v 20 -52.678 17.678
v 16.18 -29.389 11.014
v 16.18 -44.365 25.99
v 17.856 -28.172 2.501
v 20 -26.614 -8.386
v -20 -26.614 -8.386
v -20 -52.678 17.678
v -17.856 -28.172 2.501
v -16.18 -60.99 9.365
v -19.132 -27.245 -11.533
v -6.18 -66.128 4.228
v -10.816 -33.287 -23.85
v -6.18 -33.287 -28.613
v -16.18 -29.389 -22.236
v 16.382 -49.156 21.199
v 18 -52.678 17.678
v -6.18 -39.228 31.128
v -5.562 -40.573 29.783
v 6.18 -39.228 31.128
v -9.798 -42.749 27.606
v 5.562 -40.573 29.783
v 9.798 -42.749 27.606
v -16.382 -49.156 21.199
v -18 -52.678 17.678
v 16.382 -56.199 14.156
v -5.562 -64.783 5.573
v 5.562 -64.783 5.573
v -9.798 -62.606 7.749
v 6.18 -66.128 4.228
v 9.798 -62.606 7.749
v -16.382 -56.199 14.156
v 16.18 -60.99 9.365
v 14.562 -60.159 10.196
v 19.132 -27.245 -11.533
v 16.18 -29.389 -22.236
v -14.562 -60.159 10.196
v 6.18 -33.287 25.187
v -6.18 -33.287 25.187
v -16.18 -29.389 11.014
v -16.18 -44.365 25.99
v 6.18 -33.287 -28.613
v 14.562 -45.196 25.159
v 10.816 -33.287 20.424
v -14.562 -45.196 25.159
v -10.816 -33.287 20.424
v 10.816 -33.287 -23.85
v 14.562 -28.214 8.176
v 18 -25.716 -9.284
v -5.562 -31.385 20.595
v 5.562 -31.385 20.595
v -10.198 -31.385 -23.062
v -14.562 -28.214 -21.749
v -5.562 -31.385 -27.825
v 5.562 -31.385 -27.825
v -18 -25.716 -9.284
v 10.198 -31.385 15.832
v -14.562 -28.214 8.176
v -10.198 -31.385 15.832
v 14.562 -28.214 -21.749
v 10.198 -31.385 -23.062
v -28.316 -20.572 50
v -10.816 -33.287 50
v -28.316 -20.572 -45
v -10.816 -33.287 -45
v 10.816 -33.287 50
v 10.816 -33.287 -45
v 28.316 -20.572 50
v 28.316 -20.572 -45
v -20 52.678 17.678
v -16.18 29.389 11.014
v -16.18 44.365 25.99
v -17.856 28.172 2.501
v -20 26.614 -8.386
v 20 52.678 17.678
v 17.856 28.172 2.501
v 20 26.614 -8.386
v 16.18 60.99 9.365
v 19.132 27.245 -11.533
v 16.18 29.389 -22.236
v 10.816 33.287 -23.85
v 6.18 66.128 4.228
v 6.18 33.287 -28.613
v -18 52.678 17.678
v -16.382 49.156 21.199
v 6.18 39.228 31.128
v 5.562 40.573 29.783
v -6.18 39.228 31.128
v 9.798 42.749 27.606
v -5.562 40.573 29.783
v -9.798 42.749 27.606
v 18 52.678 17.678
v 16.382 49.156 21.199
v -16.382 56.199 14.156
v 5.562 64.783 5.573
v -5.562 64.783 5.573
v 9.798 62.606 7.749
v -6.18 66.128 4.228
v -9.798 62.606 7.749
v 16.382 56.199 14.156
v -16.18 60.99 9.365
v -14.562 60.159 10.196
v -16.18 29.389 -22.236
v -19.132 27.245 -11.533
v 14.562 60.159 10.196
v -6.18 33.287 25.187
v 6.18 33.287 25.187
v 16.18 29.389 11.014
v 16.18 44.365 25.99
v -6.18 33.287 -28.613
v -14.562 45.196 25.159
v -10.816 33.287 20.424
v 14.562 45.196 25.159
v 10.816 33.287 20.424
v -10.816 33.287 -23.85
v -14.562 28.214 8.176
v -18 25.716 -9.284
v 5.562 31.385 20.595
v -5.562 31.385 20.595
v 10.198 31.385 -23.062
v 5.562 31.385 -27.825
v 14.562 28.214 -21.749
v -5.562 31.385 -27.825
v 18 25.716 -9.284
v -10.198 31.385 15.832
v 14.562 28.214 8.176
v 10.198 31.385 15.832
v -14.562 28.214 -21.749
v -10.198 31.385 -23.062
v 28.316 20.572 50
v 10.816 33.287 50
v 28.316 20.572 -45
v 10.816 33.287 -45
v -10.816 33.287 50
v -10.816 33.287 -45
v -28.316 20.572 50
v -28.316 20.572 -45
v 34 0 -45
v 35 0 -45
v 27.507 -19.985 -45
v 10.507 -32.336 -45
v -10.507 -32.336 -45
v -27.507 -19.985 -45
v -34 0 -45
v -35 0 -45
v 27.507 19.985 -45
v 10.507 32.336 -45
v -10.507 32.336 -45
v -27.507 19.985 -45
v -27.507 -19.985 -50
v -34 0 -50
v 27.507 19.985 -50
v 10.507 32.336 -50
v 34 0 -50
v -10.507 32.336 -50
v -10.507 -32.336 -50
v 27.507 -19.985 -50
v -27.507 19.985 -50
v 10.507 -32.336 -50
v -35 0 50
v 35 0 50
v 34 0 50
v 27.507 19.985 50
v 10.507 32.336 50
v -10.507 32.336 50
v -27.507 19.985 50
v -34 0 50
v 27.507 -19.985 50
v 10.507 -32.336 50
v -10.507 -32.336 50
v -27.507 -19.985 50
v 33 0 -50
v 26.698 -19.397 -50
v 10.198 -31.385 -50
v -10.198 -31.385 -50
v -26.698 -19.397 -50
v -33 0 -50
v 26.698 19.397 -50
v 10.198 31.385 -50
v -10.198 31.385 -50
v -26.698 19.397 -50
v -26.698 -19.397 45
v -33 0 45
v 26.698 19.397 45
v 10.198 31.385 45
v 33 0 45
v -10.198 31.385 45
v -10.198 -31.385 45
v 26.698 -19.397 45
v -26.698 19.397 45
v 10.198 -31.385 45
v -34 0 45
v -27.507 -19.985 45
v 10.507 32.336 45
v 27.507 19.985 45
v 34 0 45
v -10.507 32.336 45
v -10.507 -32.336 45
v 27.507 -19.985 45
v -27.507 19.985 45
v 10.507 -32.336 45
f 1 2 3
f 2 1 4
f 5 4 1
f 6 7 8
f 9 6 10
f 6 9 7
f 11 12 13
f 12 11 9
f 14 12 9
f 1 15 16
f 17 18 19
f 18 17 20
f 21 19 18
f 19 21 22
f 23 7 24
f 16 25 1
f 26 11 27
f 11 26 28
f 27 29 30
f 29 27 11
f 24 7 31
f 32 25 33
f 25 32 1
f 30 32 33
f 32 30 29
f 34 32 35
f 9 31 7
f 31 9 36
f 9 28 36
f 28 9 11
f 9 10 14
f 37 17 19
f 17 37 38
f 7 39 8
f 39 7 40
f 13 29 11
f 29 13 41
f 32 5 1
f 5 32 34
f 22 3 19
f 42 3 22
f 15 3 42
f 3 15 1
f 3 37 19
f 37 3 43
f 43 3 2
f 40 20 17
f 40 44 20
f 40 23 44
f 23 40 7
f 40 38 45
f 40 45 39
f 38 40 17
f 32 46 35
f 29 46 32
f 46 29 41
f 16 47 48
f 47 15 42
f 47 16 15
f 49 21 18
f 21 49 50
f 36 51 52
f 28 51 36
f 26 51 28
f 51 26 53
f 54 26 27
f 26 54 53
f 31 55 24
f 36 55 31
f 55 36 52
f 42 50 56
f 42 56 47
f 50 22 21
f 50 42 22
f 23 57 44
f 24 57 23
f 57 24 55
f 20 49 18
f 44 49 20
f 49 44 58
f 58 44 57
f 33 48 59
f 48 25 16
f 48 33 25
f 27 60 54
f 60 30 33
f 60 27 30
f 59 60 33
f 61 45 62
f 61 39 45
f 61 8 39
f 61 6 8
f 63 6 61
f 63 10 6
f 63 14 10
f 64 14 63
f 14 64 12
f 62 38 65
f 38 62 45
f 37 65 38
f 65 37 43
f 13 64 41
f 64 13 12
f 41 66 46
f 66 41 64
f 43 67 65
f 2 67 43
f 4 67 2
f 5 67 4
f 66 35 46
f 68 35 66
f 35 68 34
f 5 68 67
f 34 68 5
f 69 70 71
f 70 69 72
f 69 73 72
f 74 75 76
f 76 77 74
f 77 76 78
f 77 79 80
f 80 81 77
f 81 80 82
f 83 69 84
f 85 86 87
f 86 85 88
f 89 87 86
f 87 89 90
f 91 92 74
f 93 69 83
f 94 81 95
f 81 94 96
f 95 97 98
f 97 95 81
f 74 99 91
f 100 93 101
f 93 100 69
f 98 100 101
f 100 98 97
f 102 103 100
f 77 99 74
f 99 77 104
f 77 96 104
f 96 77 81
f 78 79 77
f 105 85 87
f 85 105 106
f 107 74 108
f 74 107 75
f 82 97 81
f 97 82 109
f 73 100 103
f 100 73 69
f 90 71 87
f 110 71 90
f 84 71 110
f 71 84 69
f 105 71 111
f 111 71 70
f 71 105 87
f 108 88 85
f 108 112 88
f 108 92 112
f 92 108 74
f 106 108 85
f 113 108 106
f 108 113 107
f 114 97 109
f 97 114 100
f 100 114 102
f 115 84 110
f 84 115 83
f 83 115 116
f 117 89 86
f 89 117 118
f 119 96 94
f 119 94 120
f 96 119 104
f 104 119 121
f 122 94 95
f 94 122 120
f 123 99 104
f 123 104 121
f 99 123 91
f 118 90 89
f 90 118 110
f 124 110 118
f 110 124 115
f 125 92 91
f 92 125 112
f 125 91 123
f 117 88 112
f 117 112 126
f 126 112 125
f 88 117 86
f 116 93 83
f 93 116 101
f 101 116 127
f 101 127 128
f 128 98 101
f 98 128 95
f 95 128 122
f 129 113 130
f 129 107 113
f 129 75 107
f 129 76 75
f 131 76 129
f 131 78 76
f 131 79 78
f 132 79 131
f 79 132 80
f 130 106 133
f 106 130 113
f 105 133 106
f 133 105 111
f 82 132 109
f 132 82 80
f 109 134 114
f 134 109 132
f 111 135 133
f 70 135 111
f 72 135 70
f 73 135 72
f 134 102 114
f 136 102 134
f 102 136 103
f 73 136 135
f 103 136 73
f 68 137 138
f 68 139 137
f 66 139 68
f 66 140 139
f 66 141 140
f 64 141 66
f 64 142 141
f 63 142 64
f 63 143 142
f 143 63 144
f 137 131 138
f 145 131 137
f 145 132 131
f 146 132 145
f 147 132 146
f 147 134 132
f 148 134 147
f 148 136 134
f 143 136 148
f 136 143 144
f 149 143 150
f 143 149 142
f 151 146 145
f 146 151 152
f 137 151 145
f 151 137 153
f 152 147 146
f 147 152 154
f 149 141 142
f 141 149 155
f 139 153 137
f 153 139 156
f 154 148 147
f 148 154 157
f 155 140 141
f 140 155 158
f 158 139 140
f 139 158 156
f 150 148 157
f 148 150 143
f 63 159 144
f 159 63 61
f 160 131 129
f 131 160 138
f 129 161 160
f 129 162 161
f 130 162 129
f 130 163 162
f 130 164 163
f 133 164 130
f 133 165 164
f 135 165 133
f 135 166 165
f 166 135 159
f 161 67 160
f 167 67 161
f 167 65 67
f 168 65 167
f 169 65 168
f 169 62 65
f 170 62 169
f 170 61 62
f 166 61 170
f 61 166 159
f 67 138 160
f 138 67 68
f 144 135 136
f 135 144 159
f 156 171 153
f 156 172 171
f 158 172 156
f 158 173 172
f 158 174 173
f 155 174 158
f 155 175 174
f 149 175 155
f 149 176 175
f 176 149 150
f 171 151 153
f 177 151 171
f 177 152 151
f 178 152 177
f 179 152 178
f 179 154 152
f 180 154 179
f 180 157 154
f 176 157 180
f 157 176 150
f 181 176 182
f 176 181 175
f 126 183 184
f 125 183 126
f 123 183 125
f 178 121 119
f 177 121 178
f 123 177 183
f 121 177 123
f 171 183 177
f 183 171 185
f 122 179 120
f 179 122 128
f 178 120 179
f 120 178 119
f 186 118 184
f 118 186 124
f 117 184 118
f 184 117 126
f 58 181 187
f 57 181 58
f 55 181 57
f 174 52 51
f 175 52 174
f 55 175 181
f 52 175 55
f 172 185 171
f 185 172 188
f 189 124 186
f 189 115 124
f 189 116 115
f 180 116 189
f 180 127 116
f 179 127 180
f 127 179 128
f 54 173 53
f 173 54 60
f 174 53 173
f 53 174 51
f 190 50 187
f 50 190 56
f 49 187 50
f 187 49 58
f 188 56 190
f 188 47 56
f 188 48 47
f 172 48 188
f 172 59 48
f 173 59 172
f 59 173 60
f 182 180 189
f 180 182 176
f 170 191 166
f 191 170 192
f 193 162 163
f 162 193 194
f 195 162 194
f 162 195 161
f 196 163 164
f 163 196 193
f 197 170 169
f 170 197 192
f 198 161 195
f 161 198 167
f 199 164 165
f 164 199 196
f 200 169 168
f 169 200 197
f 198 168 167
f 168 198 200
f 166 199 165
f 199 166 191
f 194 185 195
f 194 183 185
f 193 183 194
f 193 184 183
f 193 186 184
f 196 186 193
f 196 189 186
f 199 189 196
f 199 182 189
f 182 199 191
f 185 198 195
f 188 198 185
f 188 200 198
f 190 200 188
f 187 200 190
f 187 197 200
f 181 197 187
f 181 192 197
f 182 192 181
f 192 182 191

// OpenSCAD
// file: x-way.scad
include<_variables.scad>;

// Parts
module main_body() {
    difference() {
        // Cylinder
        main_body_outer();
        main_body_inner();

        // Top joining
        translate([0, 0, $main_height/2]) cylinder(h = $joining_height, r = $joining_radius, center = true);

        // Bottom joining
        translate([0, 0, -$main_height/2])
        difference() {
            cylinder(h = $joining_height, r = $main_radius + 1, center = true);
            cylinder(h = $joining_height, r = $joining_radius, center = true);
        }
    }
}

module main_body_outer() {
    cylinder(h = $main_height, r = $main_radius, center = true);
}

module main_body_inner() {
    cylinder(h = $main_height + 1, r = $main_radius - $wall_thickness, center = true);
}

module tube_body(r, t) {
    difference() {
        difference() {
            tube_body_outer(r, t);
            tube_body_inner(r, t);
        }
        main_body_outer();
    }
}

module tube_body_outer(r, t) {
    translate(t) {
        rotate(r) {
            cylinder(h = $tube_height, r = $tube_radius, center = true);
        }
    }
}

module tube_body_inner(r, t) {
    translate(t) {
        rotate(r) {
            cylinder(h = $tube_height + 1, r = $tube_radius - $wall_thickness, center = true);
        }
    }
}

// Assembled modules

module xWay(count) {
    $max_angle = 180;
    $per_item = $max_angle / count;
    
    if(count > 0) {
        for (i = [0 : count - 1]) {
            rotate([0, 0, i * $per_item * 2]) tube_body([45, 0, 0], [0, -$main_radius, 0]);
        }
    }

    difference() {
        main_body();
        if(count > 0) {
            for (i = [0 : count - 1]) {
                rotate([0, 0, i * $per_item * 2]) tube_body_inner([45, 0, 0], [0, -$main_radius, 0]);
            }
        }
    }
}
// file: _variables.scad
/* [Render] */
$fa=1;
$fs=0.4;
$fn=10;
$show_helpers = false;

/* [General] */
$wall_thickness = 2;

/* [Main Body] */
$main_height = 100;
$main_radius = 35;
$joining_height = 10;
$joining_radius = $main_radius - $wall_thickness / 2;

/* [Tubes] */
$tube_height = $main_height / 2;
$tube_radius = $main_radius - 15;
$tube_hole_dimensions = 15;
$tube_hole_offset = 0;

/* [Cover] */
$hole_radius = $main_radius / 2.5;

/* [Planter] */
$stripes_count = 8;
$stripe_width = 5.0;
$planter_hole_radius = 2.5;

/* [Tray] */
$tray_thickness = 2.5;
$tray_hole_radius = 1;
$tray_radius = $main_radius - $wall_thickness;
$tray_holes_per_rotation = 4;
$tray_rotations = 16;

/* [Water Column] */
$water_column_radius = 5;
// main file
include<_variables.scad>;
use <x-way.scad>;

/*  Check settings ("customizer variables") in x-way.scad.
    The current config is pre-defined for a 150x150x150mm printing area.
    To tweak use one of the following:
    1. via OpenSCAD's Command-Line
        Use the `--D` flag to change variables.
        E.g. `--D $fn=100` to make the circles smooth.
    2. via OpenSCAD GUI
        Open this file and check the Customizer panel.
        In case the variables don't show up, proceed to the 3rd option.
    3. via an Editor (or OpenSCAD GUI)
        Open the file from above (`use <THIS FILE.scad>`) in either 
        an Editor or OpenSCAD GUI and change the variables in code
        or inside the Customizer. 
        Afterwards (re-)open this file in OpenSCAD and see the changes.

        Note: Editing the variables inside the code will affect ALL models
        depending on it. This can have advantages, but also disadvantages.
*/

// ---

xWay(2);
